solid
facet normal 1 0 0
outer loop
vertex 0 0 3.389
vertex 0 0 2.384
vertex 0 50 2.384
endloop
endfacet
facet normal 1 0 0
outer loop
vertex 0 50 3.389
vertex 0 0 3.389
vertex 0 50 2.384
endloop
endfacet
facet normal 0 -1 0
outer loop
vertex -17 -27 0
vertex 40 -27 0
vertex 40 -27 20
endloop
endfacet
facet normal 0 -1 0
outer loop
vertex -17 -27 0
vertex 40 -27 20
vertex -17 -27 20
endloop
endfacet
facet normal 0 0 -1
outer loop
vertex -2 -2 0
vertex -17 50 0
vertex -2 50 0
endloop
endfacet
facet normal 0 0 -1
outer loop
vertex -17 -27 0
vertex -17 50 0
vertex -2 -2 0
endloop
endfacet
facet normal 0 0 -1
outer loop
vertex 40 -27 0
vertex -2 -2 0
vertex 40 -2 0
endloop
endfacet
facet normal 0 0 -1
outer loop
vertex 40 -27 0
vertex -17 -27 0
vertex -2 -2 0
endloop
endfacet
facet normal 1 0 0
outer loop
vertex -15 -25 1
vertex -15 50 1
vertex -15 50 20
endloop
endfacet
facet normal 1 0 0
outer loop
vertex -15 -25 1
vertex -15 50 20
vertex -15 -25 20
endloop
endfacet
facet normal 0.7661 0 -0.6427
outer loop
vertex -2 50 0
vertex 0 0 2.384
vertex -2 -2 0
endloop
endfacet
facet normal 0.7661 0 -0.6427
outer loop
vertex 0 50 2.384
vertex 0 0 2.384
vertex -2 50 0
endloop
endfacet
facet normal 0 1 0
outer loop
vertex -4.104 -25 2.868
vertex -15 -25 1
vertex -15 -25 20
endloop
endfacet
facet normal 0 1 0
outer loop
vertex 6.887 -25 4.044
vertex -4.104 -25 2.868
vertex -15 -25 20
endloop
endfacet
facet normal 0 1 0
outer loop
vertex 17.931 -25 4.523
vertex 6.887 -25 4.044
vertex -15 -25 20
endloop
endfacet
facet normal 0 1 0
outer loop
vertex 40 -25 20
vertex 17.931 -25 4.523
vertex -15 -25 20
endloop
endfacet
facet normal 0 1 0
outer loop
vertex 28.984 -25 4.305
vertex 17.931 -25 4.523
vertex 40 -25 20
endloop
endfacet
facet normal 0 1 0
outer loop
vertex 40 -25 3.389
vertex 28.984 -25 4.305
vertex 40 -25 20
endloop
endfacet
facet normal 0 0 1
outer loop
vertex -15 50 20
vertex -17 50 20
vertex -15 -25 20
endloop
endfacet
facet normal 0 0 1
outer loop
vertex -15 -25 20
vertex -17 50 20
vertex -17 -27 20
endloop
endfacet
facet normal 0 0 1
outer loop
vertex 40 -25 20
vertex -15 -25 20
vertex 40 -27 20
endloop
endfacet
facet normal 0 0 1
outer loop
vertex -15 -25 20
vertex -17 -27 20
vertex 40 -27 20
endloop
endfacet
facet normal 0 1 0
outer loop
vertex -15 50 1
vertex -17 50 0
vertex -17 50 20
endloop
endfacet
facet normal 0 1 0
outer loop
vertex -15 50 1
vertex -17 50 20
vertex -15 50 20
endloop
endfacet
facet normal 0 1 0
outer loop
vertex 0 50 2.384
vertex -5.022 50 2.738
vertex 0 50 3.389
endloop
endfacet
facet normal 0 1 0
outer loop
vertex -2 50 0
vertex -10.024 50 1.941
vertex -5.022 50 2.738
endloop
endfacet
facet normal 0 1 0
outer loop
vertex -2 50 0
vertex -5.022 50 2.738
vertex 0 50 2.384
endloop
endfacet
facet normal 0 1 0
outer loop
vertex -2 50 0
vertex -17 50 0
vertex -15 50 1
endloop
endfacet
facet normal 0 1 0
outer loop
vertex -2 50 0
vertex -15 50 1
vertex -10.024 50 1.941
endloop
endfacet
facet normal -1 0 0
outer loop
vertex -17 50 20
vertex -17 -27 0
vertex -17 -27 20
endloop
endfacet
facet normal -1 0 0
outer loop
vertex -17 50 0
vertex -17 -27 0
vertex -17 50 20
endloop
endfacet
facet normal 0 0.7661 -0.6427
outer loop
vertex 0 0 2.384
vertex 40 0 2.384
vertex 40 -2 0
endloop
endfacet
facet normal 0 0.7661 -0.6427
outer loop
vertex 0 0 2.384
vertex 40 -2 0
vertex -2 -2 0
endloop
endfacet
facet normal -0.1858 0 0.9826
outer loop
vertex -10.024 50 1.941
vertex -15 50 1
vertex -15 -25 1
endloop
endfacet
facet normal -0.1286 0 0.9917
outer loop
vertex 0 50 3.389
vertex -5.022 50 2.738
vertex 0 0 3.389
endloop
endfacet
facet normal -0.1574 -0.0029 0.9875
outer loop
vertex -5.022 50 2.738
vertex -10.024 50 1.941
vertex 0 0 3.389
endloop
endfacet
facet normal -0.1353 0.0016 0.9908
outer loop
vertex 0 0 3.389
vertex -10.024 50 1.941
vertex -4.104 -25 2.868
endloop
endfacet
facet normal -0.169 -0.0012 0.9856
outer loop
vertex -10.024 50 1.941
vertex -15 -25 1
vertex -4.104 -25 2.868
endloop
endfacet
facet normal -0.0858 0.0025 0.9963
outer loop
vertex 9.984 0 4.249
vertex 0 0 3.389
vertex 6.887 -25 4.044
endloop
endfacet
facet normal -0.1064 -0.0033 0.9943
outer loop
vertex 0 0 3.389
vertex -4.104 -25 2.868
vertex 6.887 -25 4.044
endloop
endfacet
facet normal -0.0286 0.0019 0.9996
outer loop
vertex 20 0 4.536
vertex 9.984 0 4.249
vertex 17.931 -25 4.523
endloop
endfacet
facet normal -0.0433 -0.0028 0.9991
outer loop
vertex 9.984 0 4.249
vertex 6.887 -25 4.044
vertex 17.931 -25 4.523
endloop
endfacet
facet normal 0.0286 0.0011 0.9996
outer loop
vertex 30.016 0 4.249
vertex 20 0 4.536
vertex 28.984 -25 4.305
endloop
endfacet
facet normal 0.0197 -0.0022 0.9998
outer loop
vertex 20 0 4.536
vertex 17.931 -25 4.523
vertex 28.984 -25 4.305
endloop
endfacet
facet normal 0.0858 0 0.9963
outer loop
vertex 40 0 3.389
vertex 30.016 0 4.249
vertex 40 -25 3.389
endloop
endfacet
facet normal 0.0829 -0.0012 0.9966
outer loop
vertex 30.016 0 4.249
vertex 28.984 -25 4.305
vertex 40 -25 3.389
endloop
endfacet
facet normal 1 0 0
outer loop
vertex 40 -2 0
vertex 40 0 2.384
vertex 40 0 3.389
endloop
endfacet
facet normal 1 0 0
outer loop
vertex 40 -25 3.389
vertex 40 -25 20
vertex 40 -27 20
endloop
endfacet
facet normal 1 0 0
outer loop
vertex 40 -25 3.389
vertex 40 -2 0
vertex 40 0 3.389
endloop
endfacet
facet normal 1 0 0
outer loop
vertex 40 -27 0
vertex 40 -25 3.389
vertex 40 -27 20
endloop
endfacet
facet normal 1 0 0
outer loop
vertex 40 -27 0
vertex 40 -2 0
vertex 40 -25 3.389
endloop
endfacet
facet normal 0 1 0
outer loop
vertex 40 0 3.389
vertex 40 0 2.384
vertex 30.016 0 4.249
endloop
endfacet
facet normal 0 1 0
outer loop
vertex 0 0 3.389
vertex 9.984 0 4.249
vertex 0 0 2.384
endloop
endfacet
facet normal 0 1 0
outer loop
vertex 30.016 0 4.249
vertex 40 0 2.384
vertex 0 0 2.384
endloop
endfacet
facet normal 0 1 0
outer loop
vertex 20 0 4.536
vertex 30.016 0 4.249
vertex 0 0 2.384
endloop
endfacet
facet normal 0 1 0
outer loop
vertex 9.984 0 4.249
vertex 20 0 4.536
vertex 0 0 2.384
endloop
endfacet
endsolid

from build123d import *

# Parameters (mm, degrees)
F1_DEPTH = 5
F3_DEPTH = 80
F5_DEPTH = 20
F6_SIZE2 = 2.3835071852
F6_SIZE  = 2


with BuildPart() as f1:
    # F0 (on Top) → F1 (new body)
    with BuildSketch(Plane.XY):
        Polygon((0, 0), (0, 50), (-15, 50), (-15, -25), (40, -25), (40, 0), align=None)
    extrude(amount=F1_DEPTH)

    # F2 (on face) → F3 (cut)
    with BuildSketch(Plane.XZ.offset(25)):
        with BuildLine():
            ThreePointArc((-15, 1), (12.4054654459, 4.3708490427), (40, 3.3891045123))
            Line((40, 3.3891045123), (40, 5))
            Line((40, 5), (-15, 5))
            Line((-15, 5), (-15, 1))
        make_face()
    extrude(amount=-F3_DEPTH, mode=Mode.SUBTRACT)

    # F4 (on face) → F5 (join)
    with BuildSketch(Plane(origin=(0, 0, 0), x_dir=(1, 0, 0), z_dir=(0, 0, -1))):
        Polygon((-17, -50), (-15, -50), (-15, 25), (40, 25), (40, 27), (-17, 27), align=None)
    extrude(amount=-F5_DEPTH)

    # F6
    f6_edges = [f1.edges().sort_by_distance(p)[0] for p in [
        (20, 0, 0),
        (0, 25, 0),
    ]]
    f6_side = f1.faces().sort_by_distance((-0.958019, 25, 0))[0]
    chamfer(f6_edges, length=F6_SIZE, length2=F6_SIZE2, reference=f6_side)


solid = f1.part
